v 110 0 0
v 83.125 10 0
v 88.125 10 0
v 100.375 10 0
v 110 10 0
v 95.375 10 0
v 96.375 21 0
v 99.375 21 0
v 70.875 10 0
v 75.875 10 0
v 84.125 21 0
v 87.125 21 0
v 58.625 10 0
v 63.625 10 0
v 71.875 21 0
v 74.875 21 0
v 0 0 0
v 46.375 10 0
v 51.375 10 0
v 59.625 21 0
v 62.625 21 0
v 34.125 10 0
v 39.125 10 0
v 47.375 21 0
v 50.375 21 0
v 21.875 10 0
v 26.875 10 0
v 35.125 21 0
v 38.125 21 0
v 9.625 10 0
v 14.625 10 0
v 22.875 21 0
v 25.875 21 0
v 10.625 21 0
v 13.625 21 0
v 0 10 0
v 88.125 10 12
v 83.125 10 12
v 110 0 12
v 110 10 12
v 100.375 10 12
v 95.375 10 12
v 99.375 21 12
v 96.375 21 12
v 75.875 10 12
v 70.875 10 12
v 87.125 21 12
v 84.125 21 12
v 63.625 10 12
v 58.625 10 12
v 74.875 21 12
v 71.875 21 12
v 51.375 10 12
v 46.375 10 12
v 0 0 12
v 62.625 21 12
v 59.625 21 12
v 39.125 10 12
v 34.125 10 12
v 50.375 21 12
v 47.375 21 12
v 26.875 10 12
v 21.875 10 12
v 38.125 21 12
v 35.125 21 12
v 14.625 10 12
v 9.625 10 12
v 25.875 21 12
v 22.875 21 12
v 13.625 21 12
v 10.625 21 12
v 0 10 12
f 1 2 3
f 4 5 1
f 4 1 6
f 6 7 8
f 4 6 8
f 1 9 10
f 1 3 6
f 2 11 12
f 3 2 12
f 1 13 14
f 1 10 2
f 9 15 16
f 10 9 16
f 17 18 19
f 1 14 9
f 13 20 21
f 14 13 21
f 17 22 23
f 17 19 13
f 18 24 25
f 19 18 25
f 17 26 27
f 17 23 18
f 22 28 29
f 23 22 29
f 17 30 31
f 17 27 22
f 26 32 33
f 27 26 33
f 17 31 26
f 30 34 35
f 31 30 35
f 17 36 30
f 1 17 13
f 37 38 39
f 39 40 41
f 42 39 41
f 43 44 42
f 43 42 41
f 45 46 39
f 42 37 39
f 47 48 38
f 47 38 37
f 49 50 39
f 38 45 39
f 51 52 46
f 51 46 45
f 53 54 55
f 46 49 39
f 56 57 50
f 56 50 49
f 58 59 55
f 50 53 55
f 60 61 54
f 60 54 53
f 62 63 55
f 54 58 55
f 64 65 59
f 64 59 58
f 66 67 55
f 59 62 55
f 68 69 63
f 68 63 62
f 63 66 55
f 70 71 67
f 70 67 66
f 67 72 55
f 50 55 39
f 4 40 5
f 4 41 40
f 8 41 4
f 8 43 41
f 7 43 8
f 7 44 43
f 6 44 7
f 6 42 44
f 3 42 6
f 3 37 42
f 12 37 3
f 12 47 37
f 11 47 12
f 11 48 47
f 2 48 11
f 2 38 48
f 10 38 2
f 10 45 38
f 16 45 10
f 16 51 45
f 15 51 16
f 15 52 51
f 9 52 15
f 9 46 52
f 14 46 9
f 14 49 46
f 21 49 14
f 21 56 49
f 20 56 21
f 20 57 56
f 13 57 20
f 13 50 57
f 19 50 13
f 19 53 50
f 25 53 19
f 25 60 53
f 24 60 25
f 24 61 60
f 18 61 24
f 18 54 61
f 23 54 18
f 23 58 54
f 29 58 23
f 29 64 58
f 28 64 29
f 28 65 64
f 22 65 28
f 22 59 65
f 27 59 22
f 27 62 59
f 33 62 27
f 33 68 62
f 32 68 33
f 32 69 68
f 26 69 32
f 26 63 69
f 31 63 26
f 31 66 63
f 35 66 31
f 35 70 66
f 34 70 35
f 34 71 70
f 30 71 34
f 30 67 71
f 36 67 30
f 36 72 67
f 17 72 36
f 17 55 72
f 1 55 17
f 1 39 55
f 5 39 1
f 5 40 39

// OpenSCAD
$fn = 32;

// ----------------------------------------------------------------------
// Gear rack: 8 teeth on a 110 mm bar, pitch 12.25 mm
// ----------------------------------------------------------------------

// --- parameters (mm) ---
profile_height = 12;      // extrusion height
profile_points = 36;      // points of the closed outline

profile = [[0, 0], [110, 0], [110, 10], [100.375, 10], [99.375, 21], [96.375, 21], [95.375, 10], [88.125, 10], [87.125, 21], [84.125, 21], [83.125, 10], [75.875, 10], [74.875, 21], [71.875, 21], [70.875, 10], [63.625, 10], [62.625, 21], [59.625, 21], [58.625, 10], [51.375, 10], [50.375, 21], [47.375, 21], [46.375, 10], [39.125, 10], [38.125, 21], [35.125, 21], [34.125, 10], [26.875, 10], [25.875, 21], [22.875, 21], [21.875, 10], [14.625, 10], [13.625, 21], [10.625, 21], [9.625, 10], [0, 10]];  // single closed polygon, 36 points, counter clockwise

// --- the one profile operation ---
linear_extrude(height = profile_height) polygon(points = profile);
